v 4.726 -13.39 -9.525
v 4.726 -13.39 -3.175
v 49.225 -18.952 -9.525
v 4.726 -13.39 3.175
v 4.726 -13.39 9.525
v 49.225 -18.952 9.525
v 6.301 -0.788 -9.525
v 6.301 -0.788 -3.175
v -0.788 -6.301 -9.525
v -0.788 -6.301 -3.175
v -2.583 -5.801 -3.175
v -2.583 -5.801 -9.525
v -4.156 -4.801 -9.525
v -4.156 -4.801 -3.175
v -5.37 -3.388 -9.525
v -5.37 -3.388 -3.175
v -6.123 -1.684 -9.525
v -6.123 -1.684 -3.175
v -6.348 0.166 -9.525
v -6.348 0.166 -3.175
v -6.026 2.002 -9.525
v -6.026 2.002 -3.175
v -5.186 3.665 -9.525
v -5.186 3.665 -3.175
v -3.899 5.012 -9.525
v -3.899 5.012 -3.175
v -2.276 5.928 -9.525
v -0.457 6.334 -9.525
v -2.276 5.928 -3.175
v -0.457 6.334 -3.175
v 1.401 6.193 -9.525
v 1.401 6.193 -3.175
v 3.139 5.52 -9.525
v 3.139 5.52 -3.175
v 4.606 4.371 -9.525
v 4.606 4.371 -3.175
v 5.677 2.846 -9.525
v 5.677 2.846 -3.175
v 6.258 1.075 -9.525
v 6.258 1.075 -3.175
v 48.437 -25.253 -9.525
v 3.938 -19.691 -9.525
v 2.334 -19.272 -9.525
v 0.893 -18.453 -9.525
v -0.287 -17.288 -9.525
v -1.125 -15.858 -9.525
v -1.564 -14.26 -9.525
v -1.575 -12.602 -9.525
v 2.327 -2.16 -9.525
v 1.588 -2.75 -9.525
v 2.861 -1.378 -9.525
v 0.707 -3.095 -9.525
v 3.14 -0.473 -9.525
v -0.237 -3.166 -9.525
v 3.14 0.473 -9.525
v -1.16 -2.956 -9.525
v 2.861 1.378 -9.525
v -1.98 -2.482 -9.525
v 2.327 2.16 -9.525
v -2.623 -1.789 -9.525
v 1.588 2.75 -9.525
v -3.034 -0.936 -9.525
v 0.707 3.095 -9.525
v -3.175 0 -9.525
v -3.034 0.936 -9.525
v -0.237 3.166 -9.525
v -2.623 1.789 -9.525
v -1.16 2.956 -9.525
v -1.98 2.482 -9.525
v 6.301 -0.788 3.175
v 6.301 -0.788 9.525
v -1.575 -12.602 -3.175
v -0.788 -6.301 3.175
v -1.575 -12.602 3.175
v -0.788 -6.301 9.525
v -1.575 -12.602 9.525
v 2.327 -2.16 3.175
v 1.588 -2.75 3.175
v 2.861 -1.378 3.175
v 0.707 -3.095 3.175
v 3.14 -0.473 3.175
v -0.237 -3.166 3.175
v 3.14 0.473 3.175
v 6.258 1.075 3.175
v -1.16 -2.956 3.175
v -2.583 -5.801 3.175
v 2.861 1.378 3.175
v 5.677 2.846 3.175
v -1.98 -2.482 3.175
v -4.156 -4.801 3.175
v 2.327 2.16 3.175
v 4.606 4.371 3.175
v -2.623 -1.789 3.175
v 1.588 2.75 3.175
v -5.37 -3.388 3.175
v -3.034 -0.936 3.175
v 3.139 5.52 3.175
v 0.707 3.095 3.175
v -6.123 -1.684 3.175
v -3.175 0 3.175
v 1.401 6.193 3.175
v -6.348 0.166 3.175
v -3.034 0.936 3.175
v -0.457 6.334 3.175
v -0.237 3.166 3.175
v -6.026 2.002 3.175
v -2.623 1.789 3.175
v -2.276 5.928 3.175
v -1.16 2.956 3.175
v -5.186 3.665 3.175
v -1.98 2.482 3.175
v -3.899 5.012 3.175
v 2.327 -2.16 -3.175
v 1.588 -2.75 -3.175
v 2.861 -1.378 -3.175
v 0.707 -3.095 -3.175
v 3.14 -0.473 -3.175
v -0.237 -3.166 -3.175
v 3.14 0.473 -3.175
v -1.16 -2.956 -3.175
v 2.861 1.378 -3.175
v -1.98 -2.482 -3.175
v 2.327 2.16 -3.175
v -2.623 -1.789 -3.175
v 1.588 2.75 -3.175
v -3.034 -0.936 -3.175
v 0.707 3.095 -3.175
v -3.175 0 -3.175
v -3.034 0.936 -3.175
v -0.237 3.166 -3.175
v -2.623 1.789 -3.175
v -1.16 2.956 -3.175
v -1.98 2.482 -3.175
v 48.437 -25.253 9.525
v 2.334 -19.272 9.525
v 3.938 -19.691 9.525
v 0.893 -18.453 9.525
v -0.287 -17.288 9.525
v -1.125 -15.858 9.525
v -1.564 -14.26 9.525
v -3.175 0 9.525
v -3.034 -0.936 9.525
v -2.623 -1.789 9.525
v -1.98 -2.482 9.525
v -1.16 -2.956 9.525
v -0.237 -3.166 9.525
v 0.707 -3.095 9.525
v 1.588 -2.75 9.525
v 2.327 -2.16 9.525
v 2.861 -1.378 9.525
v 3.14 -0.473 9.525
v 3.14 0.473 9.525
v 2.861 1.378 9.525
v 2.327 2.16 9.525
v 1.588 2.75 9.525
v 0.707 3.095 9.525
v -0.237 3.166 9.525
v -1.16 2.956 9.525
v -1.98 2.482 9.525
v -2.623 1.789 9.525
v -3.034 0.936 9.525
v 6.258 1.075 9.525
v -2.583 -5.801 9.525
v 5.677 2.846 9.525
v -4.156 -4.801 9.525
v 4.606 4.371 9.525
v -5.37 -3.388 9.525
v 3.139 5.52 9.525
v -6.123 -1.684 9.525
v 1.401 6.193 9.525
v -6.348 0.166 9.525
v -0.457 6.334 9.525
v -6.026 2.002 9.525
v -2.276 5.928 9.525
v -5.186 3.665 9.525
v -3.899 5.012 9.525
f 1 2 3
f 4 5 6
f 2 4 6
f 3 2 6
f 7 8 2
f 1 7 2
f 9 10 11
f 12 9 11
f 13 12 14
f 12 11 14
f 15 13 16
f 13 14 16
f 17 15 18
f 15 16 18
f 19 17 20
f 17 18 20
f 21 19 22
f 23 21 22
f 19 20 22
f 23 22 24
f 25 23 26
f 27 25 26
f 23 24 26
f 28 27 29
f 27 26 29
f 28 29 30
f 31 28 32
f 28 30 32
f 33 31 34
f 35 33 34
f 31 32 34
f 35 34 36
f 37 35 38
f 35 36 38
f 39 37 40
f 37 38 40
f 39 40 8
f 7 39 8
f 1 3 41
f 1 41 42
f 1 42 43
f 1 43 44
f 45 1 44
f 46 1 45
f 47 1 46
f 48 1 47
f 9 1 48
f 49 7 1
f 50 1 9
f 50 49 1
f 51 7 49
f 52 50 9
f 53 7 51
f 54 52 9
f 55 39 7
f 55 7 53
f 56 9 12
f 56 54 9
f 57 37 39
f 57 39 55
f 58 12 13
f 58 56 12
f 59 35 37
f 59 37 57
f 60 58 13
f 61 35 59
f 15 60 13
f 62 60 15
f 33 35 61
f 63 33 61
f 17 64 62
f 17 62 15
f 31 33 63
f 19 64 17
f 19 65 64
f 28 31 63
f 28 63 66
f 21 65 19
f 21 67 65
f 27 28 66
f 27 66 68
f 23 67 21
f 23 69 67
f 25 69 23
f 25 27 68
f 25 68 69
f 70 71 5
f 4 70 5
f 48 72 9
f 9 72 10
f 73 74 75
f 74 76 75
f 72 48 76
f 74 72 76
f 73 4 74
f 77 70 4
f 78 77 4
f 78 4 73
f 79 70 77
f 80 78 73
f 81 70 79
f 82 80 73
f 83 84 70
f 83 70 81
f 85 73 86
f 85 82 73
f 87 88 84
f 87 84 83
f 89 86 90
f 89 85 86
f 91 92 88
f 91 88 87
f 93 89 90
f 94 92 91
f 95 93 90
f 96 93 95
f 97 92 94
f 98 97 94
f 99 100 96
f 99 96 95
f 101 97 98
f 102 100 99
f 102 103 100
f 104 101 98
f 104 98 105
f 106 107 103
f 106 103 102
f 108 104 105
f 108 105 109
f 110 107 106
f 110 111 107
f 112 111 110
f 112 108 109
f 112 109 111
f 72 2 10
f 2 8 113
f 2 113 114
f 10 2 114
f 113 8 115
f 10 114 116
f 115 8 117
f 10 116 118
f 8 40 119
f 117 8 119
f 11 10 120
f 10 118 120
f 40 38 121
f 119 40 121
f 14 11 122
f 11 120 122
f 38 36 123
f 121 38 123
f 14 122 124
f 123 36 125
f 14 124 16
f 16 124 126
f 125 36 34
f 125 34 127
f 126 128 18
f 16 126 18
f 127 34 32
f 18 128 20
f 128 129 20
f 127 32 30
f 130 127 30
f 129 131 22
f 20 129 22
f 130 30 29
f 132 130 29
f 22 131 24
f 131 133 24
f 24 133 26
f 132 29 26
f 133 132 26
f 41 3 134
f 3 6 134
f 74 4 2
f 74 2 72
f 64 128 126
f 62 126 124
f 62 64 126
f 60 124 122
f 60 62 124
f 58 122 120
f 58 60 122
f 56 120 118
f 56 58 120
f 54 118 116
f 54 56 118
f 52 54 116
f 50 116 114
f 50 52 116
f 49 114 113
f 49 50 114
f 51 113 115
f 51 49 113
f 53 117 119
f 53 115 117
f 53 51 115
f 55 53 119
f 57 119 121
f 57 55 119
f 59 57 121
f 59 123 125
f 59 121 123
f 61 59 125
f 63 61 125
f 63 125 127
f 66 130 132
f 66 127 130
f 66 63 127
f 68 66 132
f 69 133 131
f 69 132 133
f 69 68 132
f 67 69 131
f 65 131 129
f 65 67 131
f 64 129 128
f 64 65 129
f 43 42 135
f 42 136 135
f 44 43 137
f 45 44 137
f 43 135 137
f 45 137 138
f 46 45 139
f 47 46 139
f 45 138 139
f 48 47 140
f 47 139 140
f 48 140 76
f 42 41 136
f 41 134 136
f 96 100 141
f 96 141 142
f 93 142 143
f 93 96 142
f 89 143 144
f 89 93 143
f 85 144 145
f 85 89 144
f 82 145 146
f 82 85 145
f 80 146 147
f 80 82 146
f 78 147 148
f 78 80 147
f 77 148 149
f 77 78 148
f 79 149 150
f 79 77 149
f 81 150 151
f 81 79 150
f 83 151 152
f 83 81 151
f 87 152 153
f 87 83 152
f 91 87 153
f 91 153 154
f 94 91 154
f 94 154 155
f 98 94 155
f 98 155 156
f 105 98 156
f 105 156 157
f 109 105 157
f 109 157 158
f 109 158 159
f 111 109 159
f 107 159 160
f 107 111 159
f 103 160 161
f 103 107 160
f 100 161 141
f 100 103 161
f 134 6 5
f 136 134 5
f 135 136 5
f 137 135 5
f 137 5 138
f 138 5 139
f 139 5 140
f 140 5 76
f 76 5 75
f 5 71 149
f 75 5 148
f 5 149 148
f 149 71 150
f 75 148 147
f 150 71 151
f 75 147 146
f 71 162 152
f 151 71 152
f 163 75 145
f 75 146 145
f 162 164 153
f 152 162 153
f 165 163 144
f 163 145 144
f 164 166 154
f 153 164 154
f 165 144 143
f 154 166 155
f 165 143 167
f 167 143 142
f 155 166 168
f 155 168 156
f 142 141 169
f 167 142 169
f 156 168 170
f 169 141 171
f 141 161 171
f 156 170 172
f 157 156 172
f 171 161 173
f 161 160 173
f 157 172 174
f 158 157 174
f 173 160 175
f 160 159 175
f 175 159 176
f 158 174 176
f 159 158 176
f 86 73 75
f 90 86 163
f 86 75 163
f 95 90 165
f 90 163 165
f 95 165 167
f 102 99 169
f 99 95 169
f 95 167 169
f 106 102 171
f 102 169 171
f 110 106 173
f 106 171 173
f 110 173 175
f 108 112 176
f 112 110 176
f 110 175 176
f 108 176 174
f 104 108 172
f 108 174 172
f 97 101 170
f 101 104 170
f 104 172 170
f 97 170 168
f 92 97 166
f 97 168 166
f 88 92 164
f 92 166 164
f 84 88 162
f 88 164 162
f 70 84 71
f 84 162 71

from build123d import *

# Parameters (mm, degrees)
SKETCH1_R           = 3.175
BOSS_EXTRUDE1_DEPTH = 9.525
CUT_EXTRUDE1_START  = -6.35
CUT_EXTRUDE1_DEPTH  = 6.35
FILLET1_R           = 6.35


with BuildPart() as part:
    # Sketch1 → Boss-Extrude1 (new, symmetric)
    with BuildSketch(Plane.XY):
        with BuildLine():
            Line((6.300964517, -0.787620565), (4.725723388, -13.389549599))
            Line((4.725723388, -13.389549599), (49.224758871, -18.951929034))
            Line((49.224758871, -18.951929034), (48.437138306, -25.252893551))
            Line((48.437138306, -25.252893551), (-2.362861694, -18.902893551))
            Line((-2.362861694, -18.902893551), (-0.787620565, -6.300964517))
            ThreePointArc((-0.787620565, -6.300964517), (-3.898522896, 5.01238658), (6.300964517, -0.787620565))
        make_face()
        with Locations(Location((0, 0, 0), (0, 0, 180))):
            Circle(SKETCH1_R, mode=Mode.SUBTRACT)
    extrude(amount=BOSS_EXTRUDE1_DEPTH, both=True)

    # Sketch2 → Cut-Extrude1 (cut)
    with BuildSketch(Plane.XY.offset(9.525).offset(CUT_EXTRUDE1_START)):
        Polygon((49.224758871, -18.951929034), (-15.764537124, -10.828267035), (-12.959816333, 11.60949929), (52.029479661, 3.485837291), align=None)
    extrude(amount=-CUT_EXTRUDE1_DEPTH, mode=Mode.SUBTRACT)

    # Fillet1
    fillet1_edges = [part.edges().sort_by_distance(p)[0] for p in [
        (-2.362861694, -18.902893551, 0),
    ]]
    fillet(fillet1_edges, radius=FILLET1_R - 0.0001)  # a hair under: the kernel refuses the full size


solid = part.part
